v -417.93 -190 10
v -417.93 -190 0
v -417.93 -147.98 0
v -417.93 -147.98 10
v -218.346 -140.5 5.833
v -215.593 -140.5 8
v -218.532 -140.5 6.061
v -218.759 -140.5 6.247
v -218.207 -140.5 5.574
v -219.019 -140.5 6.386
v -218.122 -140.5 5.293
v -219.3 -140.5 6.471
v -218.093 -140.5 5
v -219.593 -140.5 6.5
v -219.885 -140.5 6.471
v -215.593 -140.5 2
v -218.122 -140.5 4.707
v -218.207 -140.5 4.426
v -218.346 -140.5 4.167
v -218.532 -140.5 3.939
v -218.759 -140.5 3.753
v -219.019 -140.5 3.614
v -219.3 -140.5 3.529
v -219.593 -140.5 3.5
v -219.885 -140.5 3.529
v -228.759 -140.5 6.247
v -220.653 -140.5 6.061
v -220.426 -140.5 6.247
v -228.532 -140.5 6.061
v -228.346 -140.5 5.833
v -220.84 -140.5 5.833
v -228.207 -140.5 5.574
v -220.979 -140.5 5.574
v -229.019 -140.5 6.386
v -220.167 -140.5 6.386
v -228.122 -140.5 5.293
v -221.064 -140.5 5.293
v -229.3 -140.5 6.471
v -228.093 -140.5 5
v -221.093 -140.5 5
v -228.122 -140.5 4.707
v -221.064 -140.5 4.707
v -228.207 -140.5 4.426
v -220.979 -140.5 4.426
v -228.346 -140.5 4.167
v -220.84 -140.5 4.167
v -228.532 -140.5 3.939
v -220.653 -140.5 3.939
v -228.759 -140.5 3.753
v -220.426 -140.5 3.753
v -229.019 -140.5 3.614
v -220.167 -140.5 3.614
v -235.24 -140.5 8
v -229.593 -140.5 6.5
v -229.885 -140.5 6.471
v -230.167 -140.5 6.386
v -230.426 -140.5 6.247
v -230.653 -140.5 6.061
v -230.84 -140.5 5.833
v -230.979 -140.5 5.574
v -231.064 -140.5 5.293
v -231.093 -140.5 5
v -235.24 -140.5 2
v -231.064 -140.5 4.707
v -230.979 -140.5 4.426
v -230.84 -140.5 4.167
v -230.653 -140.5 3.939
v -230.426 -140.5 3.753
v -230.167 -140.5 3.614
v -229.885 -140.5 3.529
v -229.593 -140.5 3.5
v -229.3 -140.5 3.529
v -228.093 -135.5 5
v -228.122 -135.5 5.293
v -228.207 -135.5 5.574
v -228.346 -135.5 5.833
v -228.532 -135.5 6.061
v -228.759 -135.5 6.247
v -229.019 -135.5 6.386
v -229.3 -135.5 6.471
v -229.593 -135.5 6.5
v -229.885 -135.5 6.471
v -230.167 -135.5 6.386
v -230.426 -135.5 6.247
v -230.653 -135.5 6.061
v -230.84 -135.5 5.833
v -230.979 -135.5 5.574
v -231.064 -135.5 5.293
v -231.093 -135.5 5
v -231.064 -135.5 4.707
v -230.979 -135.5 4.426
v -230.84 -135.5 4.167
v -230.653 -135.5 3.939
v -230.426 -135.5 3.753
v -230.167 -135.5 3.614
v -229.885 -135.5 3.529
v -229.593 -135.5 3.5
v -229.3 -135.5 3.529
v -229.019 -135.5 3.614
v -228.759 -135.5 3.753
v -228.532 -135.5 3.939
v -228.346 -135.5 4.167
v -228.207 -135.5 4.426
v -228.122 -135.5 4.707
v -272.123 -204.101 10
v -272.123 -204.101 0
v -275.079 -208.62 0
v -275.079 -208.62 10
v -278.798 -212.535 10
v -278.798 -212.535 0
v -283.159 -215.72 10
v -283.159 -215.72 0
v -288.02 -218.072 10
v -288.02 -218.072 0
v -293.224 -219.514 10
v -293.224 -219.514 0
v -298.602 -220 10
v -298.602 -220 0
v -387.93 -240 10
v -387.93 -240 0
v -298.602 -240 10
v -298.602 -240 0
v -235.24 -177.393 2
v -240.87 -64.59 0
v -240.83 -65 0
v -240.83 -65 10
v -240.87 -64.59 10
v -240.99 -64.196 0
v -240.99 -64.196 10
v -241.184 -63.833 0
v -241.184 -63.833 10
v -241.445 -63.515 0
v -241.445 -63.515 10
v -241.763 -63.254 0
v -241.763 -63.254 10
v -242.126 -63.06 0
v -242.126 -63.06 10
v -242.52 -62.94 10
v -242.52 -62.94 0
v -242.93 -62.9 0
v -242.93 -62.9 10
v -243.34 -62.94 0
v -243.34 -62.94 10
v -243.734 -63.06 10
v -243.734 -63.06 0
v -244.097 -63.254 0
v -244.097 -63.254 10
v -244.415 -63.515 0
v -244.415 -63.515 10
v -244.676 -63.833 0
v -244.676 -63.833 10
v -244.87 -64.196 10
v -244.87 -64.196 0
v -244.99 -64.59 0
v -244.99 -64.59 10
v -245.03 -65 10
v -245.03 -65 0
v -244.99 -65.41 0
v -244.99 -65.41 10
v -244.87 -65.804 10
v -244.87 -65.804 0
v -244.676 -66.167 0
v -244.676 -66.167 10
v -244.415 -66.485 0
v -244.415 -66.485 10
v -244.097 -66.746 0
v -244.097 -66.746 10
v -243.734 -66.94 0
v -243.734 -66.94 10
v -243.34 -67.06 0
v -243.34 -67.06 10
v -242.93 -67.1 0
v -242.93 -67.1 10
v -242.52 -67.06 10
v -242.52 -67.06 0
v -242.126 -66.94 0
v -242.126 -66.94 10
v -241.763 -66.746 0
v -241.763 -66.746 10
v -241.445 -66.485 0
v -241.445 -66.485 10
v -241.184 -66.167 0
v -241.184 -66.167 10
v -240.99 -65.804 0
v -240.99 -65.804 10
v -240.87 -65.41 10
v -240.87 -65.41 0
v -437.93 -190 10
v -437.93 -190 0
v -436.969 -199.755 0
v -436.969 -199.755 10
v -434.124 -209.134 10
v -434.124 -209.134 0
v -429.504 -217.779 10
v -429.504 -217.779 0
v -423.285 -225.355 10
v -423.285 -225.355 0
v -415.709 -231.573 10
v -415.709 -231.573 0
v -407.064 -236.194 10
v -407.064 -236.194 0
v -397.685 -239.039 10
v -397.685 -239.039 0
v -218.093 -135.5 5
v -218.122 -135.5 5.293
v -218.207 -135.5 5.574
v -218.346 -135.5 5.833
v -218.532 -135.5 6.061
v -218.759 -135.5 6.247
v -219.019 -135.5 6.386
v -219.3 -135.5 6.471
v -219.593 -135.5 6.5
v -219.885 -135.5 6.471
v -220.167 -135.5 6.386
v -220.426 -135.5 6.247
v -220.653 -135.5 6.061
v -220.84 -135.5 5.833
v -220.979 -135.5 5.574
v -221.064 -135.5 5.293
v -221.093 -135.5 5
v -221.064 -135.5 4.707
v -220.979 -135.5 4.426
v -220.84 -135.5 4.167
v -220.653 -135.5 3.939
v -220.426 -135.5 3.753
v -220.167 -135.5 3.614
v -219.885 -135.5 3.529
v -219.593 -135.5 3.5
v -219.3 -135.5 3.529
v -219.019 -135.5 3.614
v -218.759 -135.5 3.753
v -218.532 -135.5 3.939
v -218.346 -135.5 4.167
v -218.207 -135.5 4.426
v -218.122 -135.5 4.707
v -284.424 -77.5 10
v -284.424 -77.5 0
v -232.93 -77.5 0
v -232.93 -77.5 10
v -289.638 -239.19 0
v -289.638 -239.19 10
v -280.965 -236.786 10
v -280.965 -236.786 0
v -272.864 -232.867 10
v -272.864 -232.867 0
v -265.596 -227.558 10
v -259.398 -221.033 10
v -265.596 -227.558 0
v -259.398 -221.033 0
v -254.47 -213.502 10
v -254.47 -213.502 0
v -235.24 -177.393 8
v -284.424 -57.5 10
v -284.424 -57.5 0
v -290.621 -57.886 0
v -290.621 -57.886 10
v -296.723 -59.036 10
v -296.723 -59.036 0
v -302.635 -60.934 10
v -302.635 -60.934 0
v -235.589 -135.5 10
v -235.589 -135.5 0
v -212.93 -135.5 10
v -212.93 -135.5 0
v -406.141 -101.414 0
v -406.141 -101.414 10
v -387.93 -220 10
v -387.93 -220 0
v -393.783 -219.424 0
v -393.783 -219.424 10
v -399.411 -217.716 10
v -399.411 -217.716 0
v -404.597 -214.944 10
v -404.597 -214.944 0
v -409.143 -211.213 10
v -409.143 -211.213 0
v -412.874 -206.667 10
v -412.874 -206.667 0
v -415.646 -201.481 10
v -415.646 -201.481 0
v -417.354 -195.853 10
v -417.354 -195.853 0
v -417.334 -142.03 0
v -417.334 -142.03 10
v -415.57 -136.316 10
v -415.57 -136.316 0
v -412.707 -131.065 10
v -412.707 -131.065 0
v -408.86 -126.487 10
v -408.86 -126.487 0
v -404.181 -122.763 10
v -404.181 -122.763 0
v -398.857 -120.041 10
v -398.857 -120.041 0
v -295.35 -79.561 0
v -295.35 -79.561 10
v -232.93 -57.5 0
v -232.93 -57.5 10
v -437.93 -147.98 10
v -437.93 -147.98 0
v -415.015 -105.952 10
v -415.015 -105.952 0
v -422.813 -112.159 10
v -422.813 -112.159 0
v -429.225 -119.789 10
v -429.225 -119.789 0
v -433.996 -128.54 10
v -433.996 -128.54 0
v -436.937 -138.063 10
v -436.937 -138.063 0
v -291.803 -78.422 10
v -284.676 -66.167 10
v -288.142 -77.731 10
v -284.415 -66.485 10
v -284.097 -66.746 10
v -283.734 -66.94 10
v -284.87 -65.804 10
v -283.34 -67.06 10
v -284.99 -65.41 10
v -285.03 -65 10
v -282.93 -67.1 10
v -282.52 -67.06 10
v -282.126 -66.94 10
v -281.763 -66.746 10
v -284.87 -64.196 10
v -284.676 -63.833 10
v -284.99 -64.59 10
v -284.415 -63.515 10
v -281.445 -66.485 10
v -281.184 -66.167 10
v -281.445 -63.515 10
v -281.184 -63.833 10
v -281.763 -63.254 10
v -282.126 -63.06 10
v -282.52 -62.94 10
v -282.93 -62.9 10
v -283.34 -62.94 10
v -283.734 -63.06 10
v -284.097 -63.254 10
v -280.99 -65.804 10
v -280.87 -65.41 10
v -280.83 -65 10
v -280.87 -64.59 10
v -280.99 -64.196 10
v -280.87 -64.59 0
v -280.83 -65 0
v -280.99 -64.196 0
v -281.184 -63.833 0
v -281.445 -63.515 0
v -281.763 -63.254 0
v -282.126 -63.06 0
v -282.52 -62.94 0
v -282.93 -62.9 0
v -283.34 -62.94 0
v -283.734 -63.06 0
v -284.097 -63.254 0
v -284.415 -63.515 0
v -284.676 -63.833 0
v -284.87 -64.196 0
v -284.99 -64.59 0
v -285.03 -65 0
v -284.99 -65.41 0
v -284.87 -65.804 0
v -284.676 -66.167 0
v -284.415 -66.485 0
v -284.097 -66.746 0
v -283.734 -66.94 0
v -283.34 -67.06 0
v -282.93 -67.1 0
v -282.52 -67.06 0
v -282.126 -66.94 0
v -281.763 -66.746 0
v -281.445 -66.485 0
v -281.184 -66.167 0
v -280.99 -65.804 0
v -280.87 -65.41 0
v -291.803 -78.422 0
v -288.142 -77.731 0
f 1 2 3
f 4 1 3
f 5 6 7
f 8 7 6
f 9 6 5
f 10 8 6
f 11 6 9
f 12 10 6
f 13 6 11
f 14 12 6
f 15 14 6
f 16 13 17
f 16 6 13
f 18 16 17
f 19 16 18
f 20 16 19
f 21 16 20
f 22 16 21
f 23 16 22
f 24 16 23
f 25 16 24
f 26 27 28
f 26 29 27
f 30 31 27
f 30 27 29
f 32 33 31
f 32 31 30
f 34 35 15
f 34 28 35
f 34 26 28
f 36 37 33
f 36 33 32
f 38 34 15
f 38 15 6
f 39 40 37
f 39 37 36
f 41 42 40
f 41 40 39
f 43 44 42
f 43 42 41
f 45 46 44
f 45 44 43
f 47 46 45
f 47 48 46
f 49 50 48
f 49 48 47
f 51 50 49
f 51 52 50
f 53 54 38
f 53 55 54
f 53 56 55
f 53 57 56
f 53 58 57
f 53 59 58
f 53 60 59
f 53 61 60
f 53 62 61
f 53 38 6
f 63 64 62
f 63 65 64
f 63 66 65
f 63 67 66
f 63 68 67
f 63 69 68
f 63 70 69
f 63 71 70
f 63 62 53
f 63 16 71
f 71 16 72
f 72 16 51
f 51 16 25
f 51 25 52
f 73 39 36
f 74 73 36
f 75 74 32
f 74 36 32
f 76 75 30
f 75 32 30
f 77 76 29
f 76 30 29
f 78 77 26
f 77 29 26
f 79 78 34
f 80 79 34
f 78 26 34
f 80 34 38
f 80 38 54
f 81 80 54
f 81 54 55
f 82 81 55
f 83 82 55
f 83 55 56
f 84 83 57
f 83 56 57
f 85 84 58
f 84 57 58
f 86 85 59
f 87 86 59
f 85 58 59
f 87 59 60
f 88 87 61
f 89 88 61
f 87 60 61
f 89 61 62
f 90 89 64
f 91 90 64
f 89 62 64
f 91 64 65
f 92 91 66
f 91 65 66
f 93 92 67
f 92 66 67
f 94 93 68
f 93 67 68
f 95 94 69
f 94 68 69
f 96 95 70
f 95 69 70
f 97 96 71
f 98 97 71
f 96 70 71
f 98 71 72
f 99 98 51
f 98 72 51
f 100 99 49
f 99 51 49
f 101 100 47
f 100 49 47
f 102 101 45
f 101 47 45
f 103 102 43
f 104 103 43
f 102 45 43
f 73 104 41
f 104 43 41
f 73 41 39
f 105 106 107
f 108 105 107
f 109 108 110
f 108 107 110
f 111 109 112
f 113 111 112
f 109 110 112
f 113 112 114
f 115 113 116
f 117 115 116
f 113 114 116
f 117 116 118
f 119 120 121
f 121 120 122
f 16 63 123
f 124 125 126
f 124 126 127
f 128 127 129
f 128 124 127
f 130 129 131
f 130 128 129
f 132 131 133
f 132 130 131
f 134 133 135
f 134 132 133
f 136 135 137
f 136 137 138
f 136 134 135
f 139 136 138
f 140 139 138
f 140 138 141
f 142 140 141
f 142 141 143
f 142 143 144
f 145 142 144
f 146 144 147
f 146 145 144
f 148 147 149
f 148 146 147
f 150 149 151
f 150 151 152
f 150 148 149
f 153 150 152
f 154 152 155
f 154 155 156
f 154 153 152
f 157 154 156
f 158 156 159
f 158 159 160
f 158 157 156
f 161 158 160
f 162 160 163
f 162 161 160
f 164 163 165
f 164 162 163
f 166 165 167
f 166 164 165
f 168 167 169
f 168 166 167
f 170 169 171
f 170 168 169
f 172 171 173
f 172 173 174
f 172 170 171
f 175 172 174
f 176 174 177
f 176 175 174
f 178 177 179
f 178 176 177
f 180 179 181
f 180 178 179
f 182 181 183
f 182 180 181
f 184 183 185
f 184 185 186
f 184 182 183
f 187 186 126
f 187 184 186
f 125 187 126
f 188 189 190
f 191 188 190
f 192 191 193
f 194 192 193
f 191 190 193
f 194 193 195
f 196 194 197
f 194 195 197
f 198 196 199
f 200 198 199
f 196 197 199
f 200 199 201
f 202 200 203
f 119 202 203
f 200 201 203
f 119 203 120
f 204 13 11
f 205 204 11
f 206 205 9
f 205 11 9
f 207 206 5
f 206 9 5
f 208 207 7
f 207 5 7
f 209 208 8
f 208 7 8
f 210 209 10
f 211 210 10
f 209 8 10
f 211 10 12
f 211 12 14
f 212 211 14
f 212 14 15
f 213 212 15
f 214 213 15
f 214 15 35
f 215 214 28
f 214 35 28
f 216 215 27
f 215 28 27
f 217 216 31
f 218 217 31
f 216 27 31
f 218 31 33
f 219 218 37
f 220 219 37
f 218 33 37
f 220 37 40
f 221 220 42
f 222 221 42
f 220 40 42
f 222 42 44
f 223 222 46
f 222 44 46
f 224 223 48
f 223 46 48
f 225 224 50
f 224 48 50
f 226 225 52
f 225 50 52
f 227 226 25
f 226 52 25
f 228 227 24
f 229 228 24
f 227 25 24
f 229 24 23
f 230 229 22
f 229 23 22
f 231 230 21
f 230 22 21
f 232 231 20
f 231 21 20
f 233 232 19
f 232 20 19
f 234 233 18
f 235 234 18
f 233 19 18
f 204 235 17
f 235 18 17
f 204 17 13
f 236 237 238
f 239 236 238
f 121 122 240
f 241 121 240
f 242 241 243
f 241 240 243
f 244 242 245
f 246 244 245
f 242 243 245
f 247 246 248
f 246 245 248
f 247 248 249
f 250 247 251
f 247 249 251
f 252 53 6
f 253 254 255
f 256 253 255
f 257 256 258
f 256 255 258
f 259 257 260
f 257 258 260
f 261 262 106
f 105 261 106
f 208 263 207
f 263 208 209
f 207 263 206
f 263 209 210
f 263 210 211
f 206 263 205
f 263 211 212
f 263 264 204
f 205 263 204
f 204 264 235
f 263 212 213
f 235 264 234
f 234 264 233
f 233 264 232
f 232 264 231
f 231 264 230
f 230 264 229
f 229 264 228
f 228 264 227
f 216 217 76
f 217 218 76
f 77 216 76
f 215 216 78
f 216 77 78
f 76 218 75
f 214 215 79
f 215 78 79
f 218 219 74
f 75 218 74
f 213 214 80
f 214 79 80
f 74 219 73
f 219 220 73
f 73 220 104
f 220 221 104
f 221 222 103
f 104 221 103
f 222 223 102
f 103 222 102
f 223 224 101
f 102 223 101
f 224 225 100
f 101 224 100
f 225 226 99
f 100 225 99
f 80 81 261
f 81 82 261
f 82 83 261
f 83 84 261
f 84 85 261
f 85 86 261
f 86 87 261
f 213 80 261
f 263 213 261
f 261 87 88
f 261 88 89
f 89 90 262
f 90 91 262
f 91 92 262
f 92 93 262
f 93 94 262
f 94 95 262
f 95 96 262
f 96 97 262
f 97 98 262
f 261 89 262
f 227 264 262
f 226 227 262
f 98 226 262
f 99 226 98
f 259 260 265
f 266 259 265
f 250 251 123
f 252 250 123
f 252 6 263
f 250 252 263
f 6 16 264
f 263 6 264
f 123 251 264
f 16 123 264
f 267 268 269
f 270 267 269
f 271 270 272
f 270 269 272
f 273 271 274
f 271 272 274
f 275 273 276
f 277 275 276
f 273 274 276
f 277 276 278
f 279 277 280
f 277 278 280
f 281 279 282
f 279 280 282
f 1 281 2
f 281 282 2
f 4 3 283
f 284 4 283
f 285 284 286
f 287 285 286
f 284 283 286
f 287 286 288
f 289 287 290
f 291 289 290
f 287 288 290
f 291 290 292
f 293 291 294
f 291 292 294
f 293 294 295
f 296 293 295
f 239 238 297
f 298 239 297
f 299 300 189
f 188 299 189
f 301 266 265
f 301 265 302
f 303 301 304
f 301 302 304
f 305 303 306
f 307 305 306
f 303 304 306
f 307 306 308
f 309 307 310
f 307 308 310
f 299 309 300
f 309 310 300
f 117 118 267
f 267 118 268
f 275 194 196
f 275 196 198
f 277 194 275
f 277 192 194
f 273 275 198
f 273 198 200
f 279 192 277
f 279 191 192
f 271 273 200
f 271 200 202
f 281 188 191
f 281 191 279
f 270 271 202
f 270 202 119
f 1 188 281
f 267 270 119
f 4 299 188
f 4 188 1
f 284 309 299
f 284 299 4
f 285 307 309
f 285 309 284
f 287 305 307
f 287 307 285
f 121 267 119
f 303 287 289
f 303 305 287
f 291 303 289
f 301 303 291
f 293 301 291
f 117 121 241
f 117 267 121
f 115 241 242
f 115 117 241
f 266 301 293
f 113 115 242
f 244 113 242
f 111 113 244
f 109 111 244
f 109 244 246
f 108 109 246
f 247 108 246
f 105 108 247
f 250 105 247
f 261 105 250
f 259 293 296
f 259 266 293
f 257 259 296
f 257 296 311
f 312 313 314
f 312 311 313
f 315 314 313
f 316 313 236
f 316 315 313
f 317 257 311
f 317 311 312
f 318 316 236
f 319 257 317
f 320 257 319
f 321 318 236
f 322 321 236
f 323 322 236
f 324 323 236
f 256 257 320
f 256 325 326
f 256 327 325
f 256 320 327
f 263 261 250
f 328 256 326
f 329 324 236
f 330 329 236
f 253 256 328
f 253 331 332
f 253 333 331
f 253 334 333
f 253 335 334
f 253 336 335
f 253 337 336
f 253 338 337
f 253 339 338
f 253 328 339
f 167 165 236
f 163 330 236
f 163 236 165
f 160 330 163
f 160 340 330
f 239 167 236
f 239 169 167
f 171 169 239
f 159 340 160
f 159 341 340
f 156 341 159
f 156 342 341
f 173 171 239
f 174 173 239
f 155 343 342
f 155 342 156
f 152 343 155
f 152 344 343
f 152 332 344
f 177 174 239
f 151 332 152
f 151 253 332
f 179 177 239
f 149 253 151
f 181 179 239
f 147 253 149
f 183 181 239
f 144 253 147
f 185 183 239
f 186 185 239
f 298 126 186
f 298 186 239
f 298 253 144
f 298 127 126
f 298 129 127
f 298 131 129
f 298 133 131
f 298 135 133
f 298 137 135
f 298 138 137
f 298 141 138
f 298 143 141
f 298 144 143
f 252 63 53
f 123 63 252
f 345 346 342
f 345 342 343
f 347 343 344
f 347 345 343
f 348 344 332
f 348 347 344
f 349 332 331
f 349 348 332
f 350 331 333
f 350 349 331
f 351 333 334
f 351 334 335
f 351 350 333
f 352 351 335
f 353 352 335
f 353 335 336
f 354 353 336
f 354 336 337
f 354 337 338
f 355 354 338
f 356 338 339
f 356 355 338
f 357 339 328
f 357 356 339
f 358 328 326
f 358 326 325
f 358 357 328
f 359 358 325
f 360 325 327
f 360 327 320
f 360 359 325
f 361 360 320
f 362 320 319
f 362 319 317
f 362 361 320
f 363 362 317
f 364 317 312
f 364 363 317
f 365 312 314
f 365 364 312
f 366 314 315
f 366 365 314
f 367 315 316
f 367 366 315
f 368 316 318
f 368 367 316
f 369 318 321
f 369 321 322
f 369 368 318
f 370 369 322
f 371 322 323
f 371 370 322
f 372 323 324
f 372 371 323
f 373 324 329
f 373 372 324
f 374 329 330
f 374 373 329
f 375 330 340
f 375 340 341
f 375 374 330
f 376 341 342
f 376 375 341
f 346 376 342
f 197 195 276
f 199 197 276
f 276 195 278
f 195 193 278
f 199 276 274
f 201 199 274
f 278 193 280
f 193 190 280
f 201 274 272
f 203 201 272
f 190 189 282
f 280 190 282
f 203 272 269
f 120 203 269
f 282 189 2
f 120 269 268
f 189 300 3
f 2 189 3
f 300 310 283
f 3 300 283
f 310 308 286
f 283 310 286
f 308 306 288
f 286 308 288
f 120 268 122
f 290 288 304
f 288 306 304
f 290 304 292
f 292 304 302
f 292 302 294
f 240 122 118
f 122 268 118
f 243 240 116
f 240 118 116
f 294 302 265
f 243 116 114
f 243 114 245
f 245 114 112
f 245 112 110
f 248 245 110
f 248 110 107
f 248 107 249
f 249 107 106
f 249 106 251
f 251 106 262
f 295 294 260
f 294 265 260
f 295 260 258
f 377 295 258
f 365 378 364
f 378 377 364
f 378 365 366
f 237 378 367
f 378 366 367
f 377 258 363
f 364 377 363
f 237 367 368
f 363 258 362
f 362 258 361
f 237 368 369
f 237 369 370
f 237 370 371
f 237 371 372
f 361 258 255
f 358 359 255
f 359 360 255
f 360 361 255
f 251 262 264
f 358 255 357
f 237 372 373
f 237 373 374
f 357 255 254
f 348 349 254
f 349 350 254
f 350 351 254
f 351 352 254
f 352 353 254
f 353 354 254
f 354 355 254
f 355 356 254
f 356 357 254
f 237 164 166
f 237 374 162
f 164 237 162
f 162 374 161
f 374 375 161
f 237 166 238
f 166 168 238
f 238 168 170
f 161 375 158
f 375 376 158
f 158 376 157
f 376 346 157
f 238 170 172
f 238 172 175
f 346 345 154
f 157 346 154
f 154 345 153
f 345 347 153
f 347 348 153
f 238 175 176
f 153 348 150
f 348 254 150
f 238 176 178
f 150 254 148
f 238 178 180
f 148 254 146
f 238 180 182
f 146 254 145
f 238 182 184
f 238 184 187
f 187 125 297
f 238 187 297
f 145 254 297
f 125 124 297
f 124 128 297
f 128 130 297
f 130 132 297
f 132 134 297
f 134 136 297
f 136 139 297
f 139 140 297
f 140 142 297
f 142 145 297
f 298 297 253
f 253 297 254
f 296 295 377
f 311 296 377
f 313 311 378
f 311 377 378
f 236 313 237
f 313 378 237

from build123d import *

# Parameters (mm, degrees)
SKETCH_1_R               = 2.1
EXTRUDE_1_DEPTH          = 10
CUT_EXTRUDE_1_DEPTH      = 3
CUT_EXTRUDE_1_DEPTH_BACK = 3
SKETCH_5_R               = 1.5
CUT_EXTRUDE_2_DEPTH      = 5


with BuildPart() as part:
    # 草图1 → 凸台-拉伸1 (new body)
    with BuildSketch(Plane.XY):
        with BuildLine():
            Line((-387.930073268, -240), (-298.601858772, -240))
            ThreePointArc((-298.601858772, -240), (-272.863892205, -232.866736253), (-254.469753791, -213.50228308))
            Line((-254.469753791, -213.50228308), (-212.930073268, -135.499923245))
            Line((-212.930073268, -135.499923245), (-235.589314209, -135.499923245))
            Line((-235.589314209, -135.499923245), (-272.122595783, -204.101369848))
            ThreePointArc((-272.122595783, -204.101369848), (-283.159078832, -215.720041752), (-298.601858772, -220))
            Line((-298.601858772, -220), (-387.930073268, -220))
            ThreePointArc((-387.930073268, -220), (-409.143276704, -211.213203436), (-417.930073268, -190))
            Line((-417.930073268, -190), (-417.930073268, -147.979949055))
            ThreePointArc((-417.930073268, -147.979949055), (-412.707094466, -131.065481267), (-398.856791899, -120.040607259))
            Line((-398.856791899, -120.040607259), (-295.350394851, -79.56058145))
            ThreePointArc((-295.350394851, -79.56058145), (-289.983341054, -78.019588665), (-284.42367622, -77.499923245))
            Line((-284.42367622, -77.499923245), (-232.930073268, -77.499923245))
            Line((-232.930073268, -77.499923245), (-232.930073268, -57.5))
            Line((-232.930073268, -57.5), (-284.423872481, -57.5))
            ThreePointArc((-284.423872481, -57.5), (-293.689980537, -58.366109034), (-302.635070198, -60.934430341))
            Line((-302.635070198, -60.934430341), (-406.141270986, -101.414379396))
            ThreePointArc((-406.141270986, -101.414379396), (-429.225108599, -119.789169409), (-437.930073268, -147.979949055))
            Line((-437.930073268, -147.979949055), (-437.930073268, -190))
            ThreePointArc((-437.930073268, -190), (-423.285412328, -225.355339059), (-387.930073268, -240))
        make_face()
        with Locations((-242.930073268, -65)):
            Circle(SKETCH_1_R, mode=Mode.SUBTRACT)
        with Locations((-282.930073268, -65)):
            Circle(SKETCH_1_R, mode=Mode.SUBTRACT)
    extrude(amount=EXTRUDE_1_DEPTH)

    # 草图4 → 切除-拉伸1 (cut, two sides: drawn at the far end of the back side and taken through both)
    with BuildSketch(Plane.XY.offset(5).offset(-CUT_EXTRUDE_1_DEPTH_BACK)):
        Polygon((-235.239731933, -167.152806322), (-235.239731933, -177.392542568), (-215.592792743, -140.499923245), (-230.589314209, -140.499923245), (-235.239731933, -140.499923245), align=None)
    extrude(amount=CUT_EXTRUDE_1_DEPTH + CUT_EXTRUDE_1_DEPTH_BACK, mode=Mode.SUBTRACT)

    # 草图5 → 切除-拉伸2 (cut)
    with BuildSketch(Plane.XZ.offset(140.499923245)):
        with Locations((-229.592792743, 5)):
            Circle(SKETCH_5_R)
        with Locations((-219.592792743, 5)):
            Circle(SKETCH_5_R)
    extrude(amount=-CUT_EXTRUDE_2_DEPTH, mode=Mode.SUBTRACT)


solid = part.part
